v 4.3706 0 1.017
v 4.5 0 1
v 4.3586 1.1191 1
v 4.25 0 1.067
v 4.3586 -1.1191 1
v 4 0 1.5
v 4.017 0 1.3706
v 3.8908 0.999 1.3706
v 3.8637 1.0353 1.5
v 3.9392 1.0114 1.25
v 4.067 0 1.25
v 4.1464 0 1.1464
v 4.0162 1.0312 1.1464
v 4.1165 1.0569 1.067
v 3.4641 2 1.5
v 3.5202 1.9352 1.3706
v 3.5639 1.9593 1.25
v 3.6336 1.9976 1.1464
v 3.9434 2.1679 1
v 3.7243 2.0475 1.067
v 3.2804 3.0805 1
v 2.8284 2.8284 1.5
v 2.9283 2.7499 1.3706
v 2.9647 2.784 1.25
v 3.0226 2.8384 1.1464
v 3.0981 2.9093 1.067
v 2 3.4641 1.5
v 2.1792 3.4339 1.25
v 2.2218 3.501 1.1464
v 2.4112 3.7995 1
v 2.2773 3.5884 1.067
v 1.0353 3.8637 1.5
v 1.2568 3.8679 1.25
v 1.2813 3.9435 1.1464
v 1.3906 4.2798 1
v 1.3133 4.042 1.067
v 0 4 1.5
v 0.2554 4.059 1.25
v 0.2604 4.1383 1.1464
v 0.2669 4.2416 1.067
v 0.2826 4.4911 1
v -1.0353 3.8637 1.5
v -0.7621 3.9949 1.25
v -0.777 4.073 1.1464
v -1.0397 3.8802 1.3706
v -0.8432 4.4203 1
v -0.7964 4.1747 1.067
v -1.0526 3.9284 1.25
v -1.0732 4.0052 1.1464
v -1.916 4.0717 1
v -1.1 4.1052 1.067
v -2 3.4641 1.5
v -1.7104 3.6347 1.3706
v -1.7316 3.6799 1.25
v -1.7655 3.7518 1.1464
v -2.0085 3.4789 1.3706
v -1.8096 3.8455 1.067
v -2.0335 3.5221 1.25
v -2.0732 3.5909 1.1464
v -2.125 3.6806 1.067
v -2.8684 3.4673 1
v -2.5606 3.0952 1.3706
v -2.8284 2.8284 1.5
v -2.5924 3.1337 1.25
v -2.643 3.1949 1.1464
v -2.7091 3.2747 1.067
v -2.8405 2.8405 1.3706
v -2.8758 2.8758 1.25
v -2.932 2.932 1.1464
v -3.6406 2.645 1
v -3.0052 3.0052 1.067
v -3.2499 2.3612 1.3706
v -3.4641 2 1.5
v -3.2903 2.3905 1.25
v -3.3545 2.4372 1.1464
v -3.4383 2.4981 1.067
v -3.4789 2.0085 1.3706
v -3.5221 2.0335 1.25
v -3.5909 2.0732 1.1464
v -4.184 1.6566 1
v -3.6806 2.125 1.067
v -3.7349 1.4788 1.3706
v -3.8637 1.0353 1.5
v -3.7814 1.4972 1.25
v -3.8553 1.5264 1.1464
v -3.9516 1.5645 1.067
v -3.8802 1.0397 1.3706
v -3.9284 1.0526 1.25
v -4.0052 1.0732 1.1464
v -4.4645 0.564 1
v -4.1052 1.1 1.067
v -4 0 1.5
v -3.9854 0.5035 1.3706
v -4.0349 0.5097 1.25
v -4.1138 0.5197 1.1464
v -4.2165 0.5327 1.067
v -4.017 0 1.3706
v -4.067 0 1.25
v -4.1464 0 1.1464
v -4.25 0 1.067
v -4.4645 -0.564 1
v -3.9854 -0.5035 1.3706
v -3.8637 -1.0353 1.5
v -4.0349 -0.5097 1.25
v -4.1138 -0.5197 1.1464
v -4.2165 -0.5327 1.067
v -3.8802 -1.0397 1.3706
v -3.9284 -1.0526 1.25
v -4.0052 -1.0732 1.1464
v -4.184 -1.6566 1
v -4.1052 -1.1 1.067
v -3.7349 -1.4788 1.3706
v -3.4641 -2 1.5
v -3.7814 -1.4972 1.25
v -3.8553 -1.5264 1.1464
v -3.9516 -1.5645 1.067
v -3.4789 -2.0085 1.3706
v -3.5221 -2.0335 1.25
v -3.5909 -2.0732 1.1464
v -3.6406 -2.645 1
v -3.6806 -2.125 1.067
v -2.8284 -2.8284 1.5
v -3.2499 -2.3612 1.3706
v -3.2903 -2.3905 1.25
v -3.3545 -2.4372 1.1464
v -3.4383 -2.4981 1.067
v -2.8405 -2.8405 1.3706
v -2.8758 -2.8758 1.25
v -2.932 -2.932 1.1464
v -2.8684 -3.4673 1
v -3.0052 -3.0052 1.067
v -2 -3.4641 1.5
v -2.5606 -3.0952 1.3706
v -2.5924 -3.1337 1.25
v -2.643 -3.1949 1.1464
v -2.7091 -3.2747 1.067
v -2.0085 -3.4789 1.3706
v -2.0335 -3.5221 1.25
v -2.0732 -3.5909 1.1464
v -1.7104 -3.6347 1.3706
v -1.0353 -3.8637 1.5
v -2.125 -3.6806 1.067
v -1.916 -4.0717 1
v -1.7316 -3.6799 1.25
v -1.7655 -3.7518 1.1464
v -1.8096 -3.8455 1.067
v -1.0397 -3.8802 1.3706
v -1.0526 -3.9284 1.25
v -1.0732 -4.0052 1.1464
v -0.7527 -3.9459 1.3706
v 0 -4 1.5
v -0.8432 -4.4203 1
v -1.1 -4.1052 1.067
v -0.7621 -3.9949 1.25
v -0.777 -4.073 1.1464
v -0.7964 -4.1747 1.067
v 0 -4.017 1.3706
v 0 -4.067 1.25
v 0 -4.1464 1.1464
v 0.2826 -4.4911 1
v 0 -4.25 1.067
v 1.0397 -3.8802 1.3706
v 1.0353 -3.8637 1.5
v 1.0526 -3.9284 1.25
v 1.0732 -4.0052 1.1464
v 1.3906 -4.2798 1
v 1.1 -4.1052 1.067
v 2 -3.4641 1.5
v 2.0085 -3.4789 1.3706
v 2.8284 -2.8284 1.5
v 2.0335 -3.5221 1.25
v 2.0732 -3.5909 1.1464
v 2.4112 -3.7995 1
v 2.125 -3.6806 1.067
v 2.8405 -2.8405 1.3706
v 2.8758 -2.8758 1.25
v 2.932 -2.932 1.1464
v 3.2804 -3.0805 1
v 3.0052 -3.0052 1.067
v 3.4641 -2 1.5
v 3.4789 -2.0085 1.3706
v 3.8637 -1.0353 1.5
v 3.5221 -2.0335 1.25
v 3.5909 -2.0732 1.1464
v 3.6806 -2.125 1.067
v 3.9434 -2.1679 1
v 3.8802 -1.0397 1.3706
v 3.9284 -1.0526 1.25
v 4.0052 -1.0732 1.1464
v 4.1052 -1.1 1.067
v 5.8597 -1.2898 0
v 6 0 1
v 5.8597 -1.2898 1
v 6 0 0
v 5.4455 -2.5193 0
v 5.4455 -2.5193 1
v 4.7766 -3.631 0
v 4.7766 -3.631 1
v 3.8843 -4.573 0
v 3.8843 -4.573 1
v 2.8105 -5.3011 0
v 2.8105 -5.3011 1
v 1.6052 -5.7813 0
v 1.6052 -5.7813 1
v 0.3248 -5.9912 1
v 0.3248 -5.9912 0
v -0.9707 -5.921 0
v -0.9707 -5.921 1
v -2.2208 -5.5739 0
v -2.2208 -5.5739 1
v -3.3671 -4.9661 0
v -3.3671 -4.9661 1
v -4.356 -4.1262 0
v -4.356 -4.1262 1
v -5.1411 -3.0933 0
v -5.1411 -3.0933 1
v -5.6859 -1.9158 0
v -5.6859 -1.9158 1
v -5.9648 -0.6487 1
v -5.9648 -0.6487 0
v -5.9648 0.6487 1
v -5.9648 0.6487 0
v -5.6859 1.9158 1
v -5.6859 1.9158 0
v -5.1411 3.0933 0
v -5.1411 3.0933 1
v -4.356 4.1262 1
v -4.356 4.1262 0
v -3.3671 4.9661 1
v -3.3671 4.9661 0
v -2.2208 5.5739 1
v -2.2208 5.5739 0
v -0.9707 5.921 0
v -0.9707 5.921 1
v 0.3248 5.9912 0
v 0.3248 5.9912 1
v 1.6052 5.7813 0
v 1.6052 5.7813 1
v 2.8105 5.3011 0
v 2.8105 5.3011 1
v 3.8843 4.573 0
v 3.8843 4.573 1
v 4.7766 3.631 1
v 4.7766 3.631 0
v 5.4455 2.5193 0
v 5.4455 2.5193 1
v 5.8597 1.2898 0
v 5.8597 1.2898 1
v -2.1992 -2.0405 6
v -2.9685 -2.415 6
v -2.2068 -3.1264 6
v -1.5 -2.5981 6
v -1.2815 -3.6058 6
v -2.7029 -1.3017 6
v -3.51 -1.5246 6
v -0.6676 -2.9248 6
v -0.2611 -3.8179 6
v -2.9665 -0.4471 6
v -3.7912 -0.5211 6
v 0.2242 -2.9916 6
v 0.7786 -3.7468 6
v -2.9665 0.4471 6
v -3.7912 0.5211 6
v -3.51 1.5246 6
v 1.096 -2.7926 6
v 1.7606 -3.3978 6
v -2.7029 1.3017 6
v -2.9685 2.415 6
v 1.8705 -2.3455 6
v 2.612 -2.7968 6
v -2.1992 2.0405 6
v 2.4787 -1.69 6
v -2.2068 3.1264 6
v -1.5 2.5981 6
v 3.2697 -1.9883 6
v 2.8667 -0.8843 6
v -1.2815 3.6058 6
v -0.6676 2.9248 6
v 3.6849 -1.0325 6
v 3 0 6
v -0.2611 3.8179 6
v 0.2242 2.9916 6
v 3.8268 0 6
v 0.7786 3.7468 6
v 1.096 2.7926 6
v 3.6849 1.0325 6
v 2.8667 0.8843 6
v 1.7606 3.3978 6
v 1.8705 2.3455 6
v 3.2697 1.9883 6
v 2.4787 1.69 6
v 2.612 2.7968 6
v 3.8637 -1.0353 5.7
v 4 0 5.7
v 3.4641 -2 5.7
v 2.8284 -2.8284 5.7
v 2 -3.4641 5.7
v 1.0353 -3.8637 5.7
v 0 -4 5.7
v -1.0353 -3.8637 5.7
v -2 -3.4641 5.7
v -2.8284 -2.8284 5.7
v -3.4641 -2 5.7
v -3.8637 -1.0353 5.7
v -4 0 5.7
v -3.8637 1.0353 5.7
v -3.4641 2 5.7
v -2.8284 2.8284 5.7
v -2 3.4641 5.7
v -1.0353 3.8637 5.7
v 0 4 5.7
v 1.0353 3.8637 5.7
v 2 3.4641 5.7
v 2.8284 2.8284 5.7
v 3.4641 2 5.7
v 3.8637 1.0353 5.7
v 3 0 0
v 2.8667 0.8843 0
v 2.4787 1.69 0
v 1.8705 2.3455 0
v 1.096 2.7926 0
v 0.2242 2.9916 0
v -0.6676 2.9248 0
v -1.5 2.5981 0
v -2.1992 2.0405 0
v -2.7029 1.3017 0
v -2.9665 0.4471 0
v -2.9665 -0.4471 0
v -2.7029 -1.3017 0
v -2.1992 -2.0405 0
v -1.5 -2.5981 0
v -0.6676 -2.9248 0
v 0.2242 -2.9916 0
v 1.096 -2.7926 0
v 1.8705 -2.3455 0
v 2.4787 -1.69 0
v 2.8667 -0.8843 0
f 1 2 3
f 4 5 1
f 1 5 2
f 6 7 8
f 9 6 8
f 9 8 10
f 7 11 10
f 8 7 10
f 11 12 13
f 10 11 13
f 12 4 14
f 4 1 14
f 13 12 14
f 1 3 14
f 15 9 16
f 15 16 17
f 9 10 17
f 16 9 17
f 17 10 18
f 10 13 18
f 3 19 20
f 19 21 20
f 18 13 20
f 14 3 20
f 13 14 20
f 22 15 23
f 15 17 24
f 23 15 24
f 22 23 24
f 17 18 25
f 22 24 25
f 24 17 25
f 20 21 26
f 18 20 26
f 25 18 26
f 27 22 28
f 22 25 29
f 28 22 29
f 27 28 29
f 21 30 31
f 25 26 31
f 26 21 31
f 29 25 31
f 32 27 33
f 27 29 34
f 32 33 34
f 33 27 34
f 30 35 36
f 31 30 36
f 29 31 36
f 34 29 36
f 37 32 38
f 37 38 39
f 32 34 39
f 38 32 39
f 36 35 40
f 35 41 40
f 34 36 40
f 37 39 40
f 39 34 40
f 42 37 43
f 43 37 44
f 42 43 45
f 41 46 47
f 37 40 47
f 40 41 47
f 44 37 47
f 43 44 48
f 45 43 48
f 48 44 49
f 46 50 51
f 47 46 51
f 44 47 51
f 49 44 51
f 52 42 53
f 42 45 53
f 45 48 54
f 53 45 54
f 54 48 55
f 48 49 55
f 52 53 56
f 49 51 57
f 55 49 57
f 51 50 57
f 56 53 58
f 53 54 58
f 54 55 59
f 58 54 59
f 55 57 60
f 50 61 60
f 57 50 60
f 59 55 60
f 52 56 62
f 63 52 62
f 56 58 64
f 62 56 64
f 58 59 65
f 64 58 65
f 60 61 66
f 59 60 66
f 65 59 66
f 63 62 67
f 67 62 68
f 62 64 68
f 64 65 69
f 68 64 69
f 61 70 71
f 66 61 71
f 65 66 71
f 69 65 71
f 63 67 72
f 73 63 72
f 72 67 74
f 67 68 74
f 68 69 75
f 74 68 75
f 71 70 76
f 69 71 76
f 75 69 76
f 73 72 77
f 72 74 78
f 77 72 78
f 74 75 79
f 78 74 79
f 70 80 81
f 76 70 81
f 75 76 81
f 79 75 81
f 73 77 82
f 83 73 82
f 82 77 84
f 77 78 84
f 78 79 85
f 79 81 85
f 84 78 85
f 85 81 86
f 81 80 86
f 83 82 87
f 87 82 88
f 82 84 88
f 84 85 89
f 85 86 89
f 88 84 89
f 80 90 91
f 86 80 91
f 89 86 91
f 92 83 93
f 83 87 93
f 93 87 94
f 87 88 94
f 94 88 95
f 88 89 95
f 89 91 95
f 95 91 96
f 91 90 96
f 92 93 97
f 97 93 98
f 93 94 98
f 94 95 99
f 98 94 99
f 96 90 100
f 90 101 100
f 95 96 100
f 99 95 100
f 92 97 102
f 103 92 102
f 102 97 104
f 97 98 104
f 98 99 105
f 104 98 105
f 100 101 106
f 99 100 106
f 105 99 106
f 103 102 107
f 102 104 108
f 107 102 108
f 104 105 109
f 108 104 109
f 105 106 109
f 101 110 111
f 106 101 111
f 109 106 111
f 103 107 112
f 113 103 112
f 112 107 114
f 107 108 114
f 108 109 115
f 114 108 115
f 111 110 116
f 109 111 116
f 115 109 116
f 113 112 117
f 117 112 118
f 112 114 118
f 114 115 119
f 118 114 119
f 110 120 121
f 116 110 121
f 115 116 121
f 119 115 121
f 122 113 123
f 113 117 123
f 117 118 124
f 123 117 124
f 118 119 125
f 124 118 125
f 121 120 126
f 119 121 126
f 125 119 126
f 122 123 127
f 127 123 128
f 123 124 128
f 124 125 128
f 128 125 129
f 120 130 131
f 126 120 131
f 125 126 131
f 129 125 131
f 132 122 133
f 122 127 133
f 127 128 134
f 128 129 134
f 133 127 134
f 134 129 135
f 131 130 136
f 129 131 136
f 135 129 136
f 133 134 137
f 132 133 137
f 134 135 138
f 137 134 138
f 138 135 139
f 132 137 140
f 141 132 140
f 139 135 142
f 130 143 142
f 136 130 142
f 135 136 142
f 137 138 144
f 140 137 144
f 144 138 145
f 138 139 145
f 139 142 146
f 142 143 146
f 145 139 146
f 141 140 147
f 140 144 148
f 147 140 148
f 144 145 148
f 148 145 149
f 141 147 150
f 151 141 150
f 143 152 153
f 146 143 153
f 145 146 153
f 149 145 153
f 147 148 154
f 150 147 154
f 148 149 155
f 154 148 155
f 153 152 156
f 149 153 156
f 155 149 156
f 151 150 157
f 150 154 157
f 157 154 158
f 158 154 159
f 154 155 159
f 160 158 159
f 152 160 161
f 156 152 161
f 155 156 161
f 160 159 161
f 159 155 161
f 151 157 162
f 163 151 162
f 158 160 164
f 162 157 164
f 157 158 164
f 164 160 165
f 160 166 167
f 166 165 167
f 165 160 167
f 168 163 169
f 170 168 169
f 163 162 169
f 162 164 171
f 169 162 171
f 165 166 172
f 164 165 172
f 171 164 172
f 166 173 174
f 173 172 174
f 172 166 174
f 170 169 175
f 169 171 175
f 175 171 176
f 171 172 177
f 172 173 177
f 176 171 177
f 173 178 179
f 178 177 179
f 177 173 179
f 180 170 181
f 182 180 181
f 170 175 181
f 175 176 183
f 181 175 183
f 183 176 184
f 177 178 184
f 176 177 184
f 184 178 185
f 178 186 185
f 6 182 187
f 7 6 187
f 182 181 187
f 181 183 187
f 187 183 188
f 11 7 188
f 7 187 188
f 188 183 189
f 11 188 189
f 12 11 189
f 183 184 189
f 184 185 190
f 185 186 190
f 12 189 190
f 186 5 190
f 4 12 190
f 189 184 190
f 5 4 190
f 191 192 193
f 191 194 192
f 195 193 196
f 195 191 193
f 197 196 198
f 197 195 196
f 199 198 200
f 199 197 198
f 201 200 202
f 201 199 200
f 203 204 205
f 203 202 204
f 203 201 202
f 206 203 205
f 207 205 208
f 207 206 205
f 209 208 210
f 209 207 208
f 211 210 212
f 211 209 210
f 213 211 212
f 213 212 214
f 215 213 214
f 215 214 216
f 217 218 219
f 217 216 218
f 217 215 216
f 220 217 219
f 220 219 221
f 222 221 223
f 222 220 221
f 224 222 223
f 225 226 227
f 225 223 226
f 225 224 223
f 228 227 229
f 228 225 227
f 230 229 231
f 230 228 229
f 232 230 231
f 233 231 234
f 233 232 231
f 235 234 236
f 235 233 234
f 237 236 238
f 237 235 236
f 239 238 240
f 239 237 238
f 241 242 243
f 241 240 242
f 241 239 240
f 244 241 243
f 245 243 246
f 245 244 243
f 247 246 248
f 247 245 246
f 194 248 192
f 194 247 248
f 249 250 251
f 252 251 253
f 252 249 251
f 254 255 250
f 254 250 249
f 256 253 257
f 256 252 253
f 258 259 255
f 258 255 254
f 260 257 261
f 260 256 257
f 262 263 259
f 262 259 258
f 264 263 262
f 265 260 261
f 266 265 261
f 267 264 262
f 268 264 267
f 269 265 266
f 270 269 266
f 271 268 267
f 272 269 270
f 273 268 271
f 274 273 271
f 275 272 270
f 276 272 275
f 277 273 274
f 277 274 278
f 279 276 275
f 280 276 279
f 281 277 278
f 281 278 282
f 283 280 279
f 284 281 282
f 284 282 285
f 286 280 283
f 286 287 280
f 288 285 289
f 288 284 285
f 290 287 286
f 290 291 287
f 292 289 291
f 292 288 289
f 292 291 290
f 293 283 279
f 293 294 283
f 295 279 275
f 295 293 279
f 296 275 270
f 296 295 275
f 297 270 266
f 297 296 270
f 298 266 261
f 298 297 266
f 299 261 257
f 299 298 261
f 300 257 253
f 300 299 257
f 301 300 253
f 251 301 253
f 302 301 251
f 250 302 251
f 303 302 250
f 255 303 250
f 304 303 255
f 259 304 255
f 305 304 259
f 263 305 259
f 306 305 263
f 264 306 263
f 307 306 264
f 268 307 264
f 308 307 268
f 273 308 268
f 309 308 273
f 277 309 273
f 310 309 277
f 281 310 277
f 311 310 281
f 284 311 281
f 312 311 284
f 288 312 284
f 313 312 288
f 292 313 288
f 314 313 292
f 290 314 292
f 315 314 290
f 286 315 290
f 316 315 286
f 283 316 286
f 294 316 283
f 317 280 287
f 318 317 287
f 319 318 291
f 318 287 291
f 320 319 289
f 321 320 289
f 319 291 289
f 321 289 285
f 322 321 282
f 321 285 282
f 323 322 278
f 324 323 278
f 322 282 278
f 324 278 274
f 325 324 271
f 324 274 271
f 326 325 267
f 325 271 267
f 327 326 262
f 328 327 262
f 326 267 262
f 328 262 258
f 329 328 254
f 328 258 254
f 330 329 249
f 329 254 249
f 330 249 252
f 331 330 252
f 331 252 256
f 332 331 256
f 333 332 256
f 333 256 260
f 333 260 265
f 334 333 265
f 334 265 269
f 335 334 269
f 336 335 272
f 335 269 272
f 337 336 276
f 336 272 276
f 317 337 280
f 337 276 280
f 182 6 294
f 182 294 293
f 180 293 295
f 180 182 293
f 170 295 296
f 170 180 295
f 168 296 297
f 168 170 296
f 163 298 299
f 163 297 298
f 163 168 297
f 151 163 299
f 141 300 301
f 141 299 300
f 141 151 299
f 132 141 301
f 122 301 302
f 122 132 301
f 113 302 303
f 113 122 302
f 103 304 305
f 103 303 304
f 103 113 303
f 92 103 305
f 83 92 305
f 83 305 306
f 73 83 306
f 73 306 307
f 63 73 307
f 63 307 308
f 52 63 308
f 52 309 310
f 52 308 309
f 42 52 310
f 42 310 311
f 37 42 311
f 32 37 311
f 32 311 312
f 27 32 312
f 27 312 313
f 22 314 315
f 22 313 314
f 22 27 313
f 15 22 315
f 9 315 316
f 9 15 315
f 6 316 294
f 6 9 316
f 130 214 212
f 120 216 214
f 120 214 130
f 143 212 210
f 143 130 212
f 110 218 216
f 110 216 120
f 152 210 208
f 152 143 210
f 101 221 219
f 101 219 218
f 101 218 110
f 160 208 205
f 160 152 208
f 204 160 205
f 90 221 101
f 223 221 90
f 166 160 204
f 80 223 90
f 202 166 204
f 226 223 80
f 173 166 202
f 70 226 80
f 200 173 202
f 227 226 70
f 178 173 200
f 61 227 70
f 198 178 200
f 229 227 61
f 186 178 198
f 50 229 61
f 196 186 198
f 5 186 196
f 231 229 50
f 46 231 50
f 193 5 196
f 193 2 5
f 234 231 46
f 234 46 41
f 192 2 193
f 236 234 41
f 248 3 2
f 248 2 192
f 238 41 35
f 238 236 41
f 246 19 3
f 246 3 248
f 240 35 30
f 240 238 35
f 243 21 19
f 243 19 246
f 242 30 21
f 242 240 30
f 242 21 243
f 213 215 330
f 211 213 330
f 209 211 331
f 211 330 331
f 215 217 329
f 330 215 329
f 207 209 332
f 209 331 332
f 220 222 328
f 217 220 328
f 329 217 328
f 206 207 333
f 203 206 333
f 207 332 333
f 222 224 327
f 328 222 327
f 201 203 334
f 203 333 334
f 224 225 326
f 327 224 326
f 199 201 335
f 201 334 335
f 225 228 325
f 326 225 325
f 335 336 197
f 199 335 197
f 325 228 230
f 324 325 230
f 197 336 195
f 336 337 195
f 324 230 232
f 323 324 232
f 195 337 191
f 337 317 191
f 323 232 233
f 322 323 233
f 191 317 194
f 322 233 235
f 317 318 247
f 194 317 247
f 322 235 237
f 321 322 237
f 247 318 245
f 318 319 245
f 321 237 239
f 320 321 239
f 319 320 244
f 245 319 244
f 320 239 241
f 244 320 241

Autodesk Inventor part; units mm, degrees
ref_plane "YZ Plane" through (0, 0, 0) normal (1, 0, 0) x (0, 1, 0)
ref_plane "XZ Plane" through (0, 0, 0) normal (0, 1, 0) x (-1, 0, 0)
ref_plane "XY Plane" through (0, 0, 0) normal (0, 0, 1) x (1, 0, 0)
sketch "Sketch1" plane through (0, 0, 0) normal (0, 1, 0) x (-1, 0, 0)
  line L0 (0, 0) -> (0, 6)
  line L1 (-3, 0) -> (-3, 6)
  line L2 (-3, 6) -> (-4, 6)
  line L3 (-4, 6) -> (-4, 1)
  line L4 (-4, 1) -> (-6, 1)
  line L5 (-6, 1) -> (-6, 0)
  line L6 (-6, 0) -> (-3, 0)
  dimension "InsideDiameter" = 6
  dimension "OuterDiameter" = 8
  dimension "FlangeDiameter" = 12
  dimension "FlangeThickness" = 1
  dimension "Length" = 5
revolve "Revolution1" add sketch "Sketch1" angle 360 about axis through (0, 0, 0) along (0, 0, 1)
chamfer "Chamfer1" distance 0.3 angle 30 1 edges at (-4, 0, 6) measured on face at (3.9482, -0.6416, 4.3333)
fillet "Fillet1" radius 0.5 1 edges at (-4, 0, 1)
properties part number "GFM-0608-06" material "Acetal Resin, Black"
